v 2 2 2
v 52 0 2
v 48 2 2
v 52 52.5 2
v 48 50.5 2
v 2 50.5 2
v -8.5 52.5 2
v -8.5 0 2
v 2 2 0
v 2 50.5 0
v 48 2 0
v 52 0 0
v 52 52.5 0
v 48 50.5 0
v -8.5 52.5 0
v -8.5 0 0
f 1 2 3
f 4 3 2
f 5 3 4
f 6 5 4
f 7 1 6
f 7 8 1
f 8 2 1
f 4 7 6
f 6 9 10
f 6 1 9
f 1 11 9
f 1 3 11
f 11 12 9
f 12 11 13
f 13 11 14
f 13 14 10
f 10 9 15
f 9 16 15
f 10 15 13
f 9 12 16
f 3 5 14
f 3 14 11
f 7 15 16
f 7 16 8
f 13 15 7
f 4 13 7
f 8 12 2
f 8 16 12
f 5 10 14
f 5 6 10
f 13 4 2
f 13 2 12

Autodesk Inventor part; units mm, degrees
ref_plane "YZ Plane" through (0, 0, 0) normal (1, 0, 0) x (0, 1, 0)
ref_plane "XZ Plane" through (0, 0, 0) normal (0, 1, 0) x (-1, 0, 0)
ref_plane "XY Plane" through (0, 0, 0) normal (0, 0, 1) x (1, 0, 0)
sketch "Sketch1" plane through (0, 0, 0) normal (0, 0, 1) x (1, 0, 0)
  line L0 (0, 0) -> (50, 0)
  line L1 (50, 0) -> (50, 52.5)
  line L2 (50, 52.5) -> (0, 52.5)
  line L3 (0, 52.5) -> (0, 0)
  dimension "d0" = 50
  dimension "d1" = 52.5
extrude "Extrusion1" add sketch "Sketch1" along normal blind 2
sketch "Sketch2" plane through (0, 0, 2) normal (0, 0, 1) x (1, 0, 0)
  line L0 (2, 50.5) -> (48, 50.5)
  line L1 (48, 50.5) -> (48, 2)
  line L2 (48, 2) -> (2, 2)
  line L3 (2, 2) -> (2, 50.5)
  dimension "d4" = 46
  dimension "d5" = 48.5
extrude "Extrusion2" cut sketch "Sketch2" against normal blind 10
sketch "Sketch3" plane through (0, 0, 0) normal (-1, 0, 0) x (0, 0, 1)
  line L0 (0, 52.5) -> (0, 0) projected
  line L1 (0, 0) -> (2, 0) projected
  line L2 (2, 52.5) -> (2, 0) projected
  line L3 (0, 52.5) -> (2, 52.5) projected
extrude "Extrusion3" add sketch "Sketch3" along normal blind 8.5
sketch "Sketch4" plane through (50, 0, 0) normal (1, 0, 0) x (0, 0, -1)
  line L0 (0, 0) -> (0, 52.5) projected
  line L1 (0, 52.5) -> (-2, 52.5) projected
  line L2 (-2, 0) -> (-2, 52.5) projected
  line L3 (0, 0) -> (-2, 0) projected
extrude "Extrusion4" add sketch "Sketch4" along normal blind 2
properties part number "Zijplaat 2"
